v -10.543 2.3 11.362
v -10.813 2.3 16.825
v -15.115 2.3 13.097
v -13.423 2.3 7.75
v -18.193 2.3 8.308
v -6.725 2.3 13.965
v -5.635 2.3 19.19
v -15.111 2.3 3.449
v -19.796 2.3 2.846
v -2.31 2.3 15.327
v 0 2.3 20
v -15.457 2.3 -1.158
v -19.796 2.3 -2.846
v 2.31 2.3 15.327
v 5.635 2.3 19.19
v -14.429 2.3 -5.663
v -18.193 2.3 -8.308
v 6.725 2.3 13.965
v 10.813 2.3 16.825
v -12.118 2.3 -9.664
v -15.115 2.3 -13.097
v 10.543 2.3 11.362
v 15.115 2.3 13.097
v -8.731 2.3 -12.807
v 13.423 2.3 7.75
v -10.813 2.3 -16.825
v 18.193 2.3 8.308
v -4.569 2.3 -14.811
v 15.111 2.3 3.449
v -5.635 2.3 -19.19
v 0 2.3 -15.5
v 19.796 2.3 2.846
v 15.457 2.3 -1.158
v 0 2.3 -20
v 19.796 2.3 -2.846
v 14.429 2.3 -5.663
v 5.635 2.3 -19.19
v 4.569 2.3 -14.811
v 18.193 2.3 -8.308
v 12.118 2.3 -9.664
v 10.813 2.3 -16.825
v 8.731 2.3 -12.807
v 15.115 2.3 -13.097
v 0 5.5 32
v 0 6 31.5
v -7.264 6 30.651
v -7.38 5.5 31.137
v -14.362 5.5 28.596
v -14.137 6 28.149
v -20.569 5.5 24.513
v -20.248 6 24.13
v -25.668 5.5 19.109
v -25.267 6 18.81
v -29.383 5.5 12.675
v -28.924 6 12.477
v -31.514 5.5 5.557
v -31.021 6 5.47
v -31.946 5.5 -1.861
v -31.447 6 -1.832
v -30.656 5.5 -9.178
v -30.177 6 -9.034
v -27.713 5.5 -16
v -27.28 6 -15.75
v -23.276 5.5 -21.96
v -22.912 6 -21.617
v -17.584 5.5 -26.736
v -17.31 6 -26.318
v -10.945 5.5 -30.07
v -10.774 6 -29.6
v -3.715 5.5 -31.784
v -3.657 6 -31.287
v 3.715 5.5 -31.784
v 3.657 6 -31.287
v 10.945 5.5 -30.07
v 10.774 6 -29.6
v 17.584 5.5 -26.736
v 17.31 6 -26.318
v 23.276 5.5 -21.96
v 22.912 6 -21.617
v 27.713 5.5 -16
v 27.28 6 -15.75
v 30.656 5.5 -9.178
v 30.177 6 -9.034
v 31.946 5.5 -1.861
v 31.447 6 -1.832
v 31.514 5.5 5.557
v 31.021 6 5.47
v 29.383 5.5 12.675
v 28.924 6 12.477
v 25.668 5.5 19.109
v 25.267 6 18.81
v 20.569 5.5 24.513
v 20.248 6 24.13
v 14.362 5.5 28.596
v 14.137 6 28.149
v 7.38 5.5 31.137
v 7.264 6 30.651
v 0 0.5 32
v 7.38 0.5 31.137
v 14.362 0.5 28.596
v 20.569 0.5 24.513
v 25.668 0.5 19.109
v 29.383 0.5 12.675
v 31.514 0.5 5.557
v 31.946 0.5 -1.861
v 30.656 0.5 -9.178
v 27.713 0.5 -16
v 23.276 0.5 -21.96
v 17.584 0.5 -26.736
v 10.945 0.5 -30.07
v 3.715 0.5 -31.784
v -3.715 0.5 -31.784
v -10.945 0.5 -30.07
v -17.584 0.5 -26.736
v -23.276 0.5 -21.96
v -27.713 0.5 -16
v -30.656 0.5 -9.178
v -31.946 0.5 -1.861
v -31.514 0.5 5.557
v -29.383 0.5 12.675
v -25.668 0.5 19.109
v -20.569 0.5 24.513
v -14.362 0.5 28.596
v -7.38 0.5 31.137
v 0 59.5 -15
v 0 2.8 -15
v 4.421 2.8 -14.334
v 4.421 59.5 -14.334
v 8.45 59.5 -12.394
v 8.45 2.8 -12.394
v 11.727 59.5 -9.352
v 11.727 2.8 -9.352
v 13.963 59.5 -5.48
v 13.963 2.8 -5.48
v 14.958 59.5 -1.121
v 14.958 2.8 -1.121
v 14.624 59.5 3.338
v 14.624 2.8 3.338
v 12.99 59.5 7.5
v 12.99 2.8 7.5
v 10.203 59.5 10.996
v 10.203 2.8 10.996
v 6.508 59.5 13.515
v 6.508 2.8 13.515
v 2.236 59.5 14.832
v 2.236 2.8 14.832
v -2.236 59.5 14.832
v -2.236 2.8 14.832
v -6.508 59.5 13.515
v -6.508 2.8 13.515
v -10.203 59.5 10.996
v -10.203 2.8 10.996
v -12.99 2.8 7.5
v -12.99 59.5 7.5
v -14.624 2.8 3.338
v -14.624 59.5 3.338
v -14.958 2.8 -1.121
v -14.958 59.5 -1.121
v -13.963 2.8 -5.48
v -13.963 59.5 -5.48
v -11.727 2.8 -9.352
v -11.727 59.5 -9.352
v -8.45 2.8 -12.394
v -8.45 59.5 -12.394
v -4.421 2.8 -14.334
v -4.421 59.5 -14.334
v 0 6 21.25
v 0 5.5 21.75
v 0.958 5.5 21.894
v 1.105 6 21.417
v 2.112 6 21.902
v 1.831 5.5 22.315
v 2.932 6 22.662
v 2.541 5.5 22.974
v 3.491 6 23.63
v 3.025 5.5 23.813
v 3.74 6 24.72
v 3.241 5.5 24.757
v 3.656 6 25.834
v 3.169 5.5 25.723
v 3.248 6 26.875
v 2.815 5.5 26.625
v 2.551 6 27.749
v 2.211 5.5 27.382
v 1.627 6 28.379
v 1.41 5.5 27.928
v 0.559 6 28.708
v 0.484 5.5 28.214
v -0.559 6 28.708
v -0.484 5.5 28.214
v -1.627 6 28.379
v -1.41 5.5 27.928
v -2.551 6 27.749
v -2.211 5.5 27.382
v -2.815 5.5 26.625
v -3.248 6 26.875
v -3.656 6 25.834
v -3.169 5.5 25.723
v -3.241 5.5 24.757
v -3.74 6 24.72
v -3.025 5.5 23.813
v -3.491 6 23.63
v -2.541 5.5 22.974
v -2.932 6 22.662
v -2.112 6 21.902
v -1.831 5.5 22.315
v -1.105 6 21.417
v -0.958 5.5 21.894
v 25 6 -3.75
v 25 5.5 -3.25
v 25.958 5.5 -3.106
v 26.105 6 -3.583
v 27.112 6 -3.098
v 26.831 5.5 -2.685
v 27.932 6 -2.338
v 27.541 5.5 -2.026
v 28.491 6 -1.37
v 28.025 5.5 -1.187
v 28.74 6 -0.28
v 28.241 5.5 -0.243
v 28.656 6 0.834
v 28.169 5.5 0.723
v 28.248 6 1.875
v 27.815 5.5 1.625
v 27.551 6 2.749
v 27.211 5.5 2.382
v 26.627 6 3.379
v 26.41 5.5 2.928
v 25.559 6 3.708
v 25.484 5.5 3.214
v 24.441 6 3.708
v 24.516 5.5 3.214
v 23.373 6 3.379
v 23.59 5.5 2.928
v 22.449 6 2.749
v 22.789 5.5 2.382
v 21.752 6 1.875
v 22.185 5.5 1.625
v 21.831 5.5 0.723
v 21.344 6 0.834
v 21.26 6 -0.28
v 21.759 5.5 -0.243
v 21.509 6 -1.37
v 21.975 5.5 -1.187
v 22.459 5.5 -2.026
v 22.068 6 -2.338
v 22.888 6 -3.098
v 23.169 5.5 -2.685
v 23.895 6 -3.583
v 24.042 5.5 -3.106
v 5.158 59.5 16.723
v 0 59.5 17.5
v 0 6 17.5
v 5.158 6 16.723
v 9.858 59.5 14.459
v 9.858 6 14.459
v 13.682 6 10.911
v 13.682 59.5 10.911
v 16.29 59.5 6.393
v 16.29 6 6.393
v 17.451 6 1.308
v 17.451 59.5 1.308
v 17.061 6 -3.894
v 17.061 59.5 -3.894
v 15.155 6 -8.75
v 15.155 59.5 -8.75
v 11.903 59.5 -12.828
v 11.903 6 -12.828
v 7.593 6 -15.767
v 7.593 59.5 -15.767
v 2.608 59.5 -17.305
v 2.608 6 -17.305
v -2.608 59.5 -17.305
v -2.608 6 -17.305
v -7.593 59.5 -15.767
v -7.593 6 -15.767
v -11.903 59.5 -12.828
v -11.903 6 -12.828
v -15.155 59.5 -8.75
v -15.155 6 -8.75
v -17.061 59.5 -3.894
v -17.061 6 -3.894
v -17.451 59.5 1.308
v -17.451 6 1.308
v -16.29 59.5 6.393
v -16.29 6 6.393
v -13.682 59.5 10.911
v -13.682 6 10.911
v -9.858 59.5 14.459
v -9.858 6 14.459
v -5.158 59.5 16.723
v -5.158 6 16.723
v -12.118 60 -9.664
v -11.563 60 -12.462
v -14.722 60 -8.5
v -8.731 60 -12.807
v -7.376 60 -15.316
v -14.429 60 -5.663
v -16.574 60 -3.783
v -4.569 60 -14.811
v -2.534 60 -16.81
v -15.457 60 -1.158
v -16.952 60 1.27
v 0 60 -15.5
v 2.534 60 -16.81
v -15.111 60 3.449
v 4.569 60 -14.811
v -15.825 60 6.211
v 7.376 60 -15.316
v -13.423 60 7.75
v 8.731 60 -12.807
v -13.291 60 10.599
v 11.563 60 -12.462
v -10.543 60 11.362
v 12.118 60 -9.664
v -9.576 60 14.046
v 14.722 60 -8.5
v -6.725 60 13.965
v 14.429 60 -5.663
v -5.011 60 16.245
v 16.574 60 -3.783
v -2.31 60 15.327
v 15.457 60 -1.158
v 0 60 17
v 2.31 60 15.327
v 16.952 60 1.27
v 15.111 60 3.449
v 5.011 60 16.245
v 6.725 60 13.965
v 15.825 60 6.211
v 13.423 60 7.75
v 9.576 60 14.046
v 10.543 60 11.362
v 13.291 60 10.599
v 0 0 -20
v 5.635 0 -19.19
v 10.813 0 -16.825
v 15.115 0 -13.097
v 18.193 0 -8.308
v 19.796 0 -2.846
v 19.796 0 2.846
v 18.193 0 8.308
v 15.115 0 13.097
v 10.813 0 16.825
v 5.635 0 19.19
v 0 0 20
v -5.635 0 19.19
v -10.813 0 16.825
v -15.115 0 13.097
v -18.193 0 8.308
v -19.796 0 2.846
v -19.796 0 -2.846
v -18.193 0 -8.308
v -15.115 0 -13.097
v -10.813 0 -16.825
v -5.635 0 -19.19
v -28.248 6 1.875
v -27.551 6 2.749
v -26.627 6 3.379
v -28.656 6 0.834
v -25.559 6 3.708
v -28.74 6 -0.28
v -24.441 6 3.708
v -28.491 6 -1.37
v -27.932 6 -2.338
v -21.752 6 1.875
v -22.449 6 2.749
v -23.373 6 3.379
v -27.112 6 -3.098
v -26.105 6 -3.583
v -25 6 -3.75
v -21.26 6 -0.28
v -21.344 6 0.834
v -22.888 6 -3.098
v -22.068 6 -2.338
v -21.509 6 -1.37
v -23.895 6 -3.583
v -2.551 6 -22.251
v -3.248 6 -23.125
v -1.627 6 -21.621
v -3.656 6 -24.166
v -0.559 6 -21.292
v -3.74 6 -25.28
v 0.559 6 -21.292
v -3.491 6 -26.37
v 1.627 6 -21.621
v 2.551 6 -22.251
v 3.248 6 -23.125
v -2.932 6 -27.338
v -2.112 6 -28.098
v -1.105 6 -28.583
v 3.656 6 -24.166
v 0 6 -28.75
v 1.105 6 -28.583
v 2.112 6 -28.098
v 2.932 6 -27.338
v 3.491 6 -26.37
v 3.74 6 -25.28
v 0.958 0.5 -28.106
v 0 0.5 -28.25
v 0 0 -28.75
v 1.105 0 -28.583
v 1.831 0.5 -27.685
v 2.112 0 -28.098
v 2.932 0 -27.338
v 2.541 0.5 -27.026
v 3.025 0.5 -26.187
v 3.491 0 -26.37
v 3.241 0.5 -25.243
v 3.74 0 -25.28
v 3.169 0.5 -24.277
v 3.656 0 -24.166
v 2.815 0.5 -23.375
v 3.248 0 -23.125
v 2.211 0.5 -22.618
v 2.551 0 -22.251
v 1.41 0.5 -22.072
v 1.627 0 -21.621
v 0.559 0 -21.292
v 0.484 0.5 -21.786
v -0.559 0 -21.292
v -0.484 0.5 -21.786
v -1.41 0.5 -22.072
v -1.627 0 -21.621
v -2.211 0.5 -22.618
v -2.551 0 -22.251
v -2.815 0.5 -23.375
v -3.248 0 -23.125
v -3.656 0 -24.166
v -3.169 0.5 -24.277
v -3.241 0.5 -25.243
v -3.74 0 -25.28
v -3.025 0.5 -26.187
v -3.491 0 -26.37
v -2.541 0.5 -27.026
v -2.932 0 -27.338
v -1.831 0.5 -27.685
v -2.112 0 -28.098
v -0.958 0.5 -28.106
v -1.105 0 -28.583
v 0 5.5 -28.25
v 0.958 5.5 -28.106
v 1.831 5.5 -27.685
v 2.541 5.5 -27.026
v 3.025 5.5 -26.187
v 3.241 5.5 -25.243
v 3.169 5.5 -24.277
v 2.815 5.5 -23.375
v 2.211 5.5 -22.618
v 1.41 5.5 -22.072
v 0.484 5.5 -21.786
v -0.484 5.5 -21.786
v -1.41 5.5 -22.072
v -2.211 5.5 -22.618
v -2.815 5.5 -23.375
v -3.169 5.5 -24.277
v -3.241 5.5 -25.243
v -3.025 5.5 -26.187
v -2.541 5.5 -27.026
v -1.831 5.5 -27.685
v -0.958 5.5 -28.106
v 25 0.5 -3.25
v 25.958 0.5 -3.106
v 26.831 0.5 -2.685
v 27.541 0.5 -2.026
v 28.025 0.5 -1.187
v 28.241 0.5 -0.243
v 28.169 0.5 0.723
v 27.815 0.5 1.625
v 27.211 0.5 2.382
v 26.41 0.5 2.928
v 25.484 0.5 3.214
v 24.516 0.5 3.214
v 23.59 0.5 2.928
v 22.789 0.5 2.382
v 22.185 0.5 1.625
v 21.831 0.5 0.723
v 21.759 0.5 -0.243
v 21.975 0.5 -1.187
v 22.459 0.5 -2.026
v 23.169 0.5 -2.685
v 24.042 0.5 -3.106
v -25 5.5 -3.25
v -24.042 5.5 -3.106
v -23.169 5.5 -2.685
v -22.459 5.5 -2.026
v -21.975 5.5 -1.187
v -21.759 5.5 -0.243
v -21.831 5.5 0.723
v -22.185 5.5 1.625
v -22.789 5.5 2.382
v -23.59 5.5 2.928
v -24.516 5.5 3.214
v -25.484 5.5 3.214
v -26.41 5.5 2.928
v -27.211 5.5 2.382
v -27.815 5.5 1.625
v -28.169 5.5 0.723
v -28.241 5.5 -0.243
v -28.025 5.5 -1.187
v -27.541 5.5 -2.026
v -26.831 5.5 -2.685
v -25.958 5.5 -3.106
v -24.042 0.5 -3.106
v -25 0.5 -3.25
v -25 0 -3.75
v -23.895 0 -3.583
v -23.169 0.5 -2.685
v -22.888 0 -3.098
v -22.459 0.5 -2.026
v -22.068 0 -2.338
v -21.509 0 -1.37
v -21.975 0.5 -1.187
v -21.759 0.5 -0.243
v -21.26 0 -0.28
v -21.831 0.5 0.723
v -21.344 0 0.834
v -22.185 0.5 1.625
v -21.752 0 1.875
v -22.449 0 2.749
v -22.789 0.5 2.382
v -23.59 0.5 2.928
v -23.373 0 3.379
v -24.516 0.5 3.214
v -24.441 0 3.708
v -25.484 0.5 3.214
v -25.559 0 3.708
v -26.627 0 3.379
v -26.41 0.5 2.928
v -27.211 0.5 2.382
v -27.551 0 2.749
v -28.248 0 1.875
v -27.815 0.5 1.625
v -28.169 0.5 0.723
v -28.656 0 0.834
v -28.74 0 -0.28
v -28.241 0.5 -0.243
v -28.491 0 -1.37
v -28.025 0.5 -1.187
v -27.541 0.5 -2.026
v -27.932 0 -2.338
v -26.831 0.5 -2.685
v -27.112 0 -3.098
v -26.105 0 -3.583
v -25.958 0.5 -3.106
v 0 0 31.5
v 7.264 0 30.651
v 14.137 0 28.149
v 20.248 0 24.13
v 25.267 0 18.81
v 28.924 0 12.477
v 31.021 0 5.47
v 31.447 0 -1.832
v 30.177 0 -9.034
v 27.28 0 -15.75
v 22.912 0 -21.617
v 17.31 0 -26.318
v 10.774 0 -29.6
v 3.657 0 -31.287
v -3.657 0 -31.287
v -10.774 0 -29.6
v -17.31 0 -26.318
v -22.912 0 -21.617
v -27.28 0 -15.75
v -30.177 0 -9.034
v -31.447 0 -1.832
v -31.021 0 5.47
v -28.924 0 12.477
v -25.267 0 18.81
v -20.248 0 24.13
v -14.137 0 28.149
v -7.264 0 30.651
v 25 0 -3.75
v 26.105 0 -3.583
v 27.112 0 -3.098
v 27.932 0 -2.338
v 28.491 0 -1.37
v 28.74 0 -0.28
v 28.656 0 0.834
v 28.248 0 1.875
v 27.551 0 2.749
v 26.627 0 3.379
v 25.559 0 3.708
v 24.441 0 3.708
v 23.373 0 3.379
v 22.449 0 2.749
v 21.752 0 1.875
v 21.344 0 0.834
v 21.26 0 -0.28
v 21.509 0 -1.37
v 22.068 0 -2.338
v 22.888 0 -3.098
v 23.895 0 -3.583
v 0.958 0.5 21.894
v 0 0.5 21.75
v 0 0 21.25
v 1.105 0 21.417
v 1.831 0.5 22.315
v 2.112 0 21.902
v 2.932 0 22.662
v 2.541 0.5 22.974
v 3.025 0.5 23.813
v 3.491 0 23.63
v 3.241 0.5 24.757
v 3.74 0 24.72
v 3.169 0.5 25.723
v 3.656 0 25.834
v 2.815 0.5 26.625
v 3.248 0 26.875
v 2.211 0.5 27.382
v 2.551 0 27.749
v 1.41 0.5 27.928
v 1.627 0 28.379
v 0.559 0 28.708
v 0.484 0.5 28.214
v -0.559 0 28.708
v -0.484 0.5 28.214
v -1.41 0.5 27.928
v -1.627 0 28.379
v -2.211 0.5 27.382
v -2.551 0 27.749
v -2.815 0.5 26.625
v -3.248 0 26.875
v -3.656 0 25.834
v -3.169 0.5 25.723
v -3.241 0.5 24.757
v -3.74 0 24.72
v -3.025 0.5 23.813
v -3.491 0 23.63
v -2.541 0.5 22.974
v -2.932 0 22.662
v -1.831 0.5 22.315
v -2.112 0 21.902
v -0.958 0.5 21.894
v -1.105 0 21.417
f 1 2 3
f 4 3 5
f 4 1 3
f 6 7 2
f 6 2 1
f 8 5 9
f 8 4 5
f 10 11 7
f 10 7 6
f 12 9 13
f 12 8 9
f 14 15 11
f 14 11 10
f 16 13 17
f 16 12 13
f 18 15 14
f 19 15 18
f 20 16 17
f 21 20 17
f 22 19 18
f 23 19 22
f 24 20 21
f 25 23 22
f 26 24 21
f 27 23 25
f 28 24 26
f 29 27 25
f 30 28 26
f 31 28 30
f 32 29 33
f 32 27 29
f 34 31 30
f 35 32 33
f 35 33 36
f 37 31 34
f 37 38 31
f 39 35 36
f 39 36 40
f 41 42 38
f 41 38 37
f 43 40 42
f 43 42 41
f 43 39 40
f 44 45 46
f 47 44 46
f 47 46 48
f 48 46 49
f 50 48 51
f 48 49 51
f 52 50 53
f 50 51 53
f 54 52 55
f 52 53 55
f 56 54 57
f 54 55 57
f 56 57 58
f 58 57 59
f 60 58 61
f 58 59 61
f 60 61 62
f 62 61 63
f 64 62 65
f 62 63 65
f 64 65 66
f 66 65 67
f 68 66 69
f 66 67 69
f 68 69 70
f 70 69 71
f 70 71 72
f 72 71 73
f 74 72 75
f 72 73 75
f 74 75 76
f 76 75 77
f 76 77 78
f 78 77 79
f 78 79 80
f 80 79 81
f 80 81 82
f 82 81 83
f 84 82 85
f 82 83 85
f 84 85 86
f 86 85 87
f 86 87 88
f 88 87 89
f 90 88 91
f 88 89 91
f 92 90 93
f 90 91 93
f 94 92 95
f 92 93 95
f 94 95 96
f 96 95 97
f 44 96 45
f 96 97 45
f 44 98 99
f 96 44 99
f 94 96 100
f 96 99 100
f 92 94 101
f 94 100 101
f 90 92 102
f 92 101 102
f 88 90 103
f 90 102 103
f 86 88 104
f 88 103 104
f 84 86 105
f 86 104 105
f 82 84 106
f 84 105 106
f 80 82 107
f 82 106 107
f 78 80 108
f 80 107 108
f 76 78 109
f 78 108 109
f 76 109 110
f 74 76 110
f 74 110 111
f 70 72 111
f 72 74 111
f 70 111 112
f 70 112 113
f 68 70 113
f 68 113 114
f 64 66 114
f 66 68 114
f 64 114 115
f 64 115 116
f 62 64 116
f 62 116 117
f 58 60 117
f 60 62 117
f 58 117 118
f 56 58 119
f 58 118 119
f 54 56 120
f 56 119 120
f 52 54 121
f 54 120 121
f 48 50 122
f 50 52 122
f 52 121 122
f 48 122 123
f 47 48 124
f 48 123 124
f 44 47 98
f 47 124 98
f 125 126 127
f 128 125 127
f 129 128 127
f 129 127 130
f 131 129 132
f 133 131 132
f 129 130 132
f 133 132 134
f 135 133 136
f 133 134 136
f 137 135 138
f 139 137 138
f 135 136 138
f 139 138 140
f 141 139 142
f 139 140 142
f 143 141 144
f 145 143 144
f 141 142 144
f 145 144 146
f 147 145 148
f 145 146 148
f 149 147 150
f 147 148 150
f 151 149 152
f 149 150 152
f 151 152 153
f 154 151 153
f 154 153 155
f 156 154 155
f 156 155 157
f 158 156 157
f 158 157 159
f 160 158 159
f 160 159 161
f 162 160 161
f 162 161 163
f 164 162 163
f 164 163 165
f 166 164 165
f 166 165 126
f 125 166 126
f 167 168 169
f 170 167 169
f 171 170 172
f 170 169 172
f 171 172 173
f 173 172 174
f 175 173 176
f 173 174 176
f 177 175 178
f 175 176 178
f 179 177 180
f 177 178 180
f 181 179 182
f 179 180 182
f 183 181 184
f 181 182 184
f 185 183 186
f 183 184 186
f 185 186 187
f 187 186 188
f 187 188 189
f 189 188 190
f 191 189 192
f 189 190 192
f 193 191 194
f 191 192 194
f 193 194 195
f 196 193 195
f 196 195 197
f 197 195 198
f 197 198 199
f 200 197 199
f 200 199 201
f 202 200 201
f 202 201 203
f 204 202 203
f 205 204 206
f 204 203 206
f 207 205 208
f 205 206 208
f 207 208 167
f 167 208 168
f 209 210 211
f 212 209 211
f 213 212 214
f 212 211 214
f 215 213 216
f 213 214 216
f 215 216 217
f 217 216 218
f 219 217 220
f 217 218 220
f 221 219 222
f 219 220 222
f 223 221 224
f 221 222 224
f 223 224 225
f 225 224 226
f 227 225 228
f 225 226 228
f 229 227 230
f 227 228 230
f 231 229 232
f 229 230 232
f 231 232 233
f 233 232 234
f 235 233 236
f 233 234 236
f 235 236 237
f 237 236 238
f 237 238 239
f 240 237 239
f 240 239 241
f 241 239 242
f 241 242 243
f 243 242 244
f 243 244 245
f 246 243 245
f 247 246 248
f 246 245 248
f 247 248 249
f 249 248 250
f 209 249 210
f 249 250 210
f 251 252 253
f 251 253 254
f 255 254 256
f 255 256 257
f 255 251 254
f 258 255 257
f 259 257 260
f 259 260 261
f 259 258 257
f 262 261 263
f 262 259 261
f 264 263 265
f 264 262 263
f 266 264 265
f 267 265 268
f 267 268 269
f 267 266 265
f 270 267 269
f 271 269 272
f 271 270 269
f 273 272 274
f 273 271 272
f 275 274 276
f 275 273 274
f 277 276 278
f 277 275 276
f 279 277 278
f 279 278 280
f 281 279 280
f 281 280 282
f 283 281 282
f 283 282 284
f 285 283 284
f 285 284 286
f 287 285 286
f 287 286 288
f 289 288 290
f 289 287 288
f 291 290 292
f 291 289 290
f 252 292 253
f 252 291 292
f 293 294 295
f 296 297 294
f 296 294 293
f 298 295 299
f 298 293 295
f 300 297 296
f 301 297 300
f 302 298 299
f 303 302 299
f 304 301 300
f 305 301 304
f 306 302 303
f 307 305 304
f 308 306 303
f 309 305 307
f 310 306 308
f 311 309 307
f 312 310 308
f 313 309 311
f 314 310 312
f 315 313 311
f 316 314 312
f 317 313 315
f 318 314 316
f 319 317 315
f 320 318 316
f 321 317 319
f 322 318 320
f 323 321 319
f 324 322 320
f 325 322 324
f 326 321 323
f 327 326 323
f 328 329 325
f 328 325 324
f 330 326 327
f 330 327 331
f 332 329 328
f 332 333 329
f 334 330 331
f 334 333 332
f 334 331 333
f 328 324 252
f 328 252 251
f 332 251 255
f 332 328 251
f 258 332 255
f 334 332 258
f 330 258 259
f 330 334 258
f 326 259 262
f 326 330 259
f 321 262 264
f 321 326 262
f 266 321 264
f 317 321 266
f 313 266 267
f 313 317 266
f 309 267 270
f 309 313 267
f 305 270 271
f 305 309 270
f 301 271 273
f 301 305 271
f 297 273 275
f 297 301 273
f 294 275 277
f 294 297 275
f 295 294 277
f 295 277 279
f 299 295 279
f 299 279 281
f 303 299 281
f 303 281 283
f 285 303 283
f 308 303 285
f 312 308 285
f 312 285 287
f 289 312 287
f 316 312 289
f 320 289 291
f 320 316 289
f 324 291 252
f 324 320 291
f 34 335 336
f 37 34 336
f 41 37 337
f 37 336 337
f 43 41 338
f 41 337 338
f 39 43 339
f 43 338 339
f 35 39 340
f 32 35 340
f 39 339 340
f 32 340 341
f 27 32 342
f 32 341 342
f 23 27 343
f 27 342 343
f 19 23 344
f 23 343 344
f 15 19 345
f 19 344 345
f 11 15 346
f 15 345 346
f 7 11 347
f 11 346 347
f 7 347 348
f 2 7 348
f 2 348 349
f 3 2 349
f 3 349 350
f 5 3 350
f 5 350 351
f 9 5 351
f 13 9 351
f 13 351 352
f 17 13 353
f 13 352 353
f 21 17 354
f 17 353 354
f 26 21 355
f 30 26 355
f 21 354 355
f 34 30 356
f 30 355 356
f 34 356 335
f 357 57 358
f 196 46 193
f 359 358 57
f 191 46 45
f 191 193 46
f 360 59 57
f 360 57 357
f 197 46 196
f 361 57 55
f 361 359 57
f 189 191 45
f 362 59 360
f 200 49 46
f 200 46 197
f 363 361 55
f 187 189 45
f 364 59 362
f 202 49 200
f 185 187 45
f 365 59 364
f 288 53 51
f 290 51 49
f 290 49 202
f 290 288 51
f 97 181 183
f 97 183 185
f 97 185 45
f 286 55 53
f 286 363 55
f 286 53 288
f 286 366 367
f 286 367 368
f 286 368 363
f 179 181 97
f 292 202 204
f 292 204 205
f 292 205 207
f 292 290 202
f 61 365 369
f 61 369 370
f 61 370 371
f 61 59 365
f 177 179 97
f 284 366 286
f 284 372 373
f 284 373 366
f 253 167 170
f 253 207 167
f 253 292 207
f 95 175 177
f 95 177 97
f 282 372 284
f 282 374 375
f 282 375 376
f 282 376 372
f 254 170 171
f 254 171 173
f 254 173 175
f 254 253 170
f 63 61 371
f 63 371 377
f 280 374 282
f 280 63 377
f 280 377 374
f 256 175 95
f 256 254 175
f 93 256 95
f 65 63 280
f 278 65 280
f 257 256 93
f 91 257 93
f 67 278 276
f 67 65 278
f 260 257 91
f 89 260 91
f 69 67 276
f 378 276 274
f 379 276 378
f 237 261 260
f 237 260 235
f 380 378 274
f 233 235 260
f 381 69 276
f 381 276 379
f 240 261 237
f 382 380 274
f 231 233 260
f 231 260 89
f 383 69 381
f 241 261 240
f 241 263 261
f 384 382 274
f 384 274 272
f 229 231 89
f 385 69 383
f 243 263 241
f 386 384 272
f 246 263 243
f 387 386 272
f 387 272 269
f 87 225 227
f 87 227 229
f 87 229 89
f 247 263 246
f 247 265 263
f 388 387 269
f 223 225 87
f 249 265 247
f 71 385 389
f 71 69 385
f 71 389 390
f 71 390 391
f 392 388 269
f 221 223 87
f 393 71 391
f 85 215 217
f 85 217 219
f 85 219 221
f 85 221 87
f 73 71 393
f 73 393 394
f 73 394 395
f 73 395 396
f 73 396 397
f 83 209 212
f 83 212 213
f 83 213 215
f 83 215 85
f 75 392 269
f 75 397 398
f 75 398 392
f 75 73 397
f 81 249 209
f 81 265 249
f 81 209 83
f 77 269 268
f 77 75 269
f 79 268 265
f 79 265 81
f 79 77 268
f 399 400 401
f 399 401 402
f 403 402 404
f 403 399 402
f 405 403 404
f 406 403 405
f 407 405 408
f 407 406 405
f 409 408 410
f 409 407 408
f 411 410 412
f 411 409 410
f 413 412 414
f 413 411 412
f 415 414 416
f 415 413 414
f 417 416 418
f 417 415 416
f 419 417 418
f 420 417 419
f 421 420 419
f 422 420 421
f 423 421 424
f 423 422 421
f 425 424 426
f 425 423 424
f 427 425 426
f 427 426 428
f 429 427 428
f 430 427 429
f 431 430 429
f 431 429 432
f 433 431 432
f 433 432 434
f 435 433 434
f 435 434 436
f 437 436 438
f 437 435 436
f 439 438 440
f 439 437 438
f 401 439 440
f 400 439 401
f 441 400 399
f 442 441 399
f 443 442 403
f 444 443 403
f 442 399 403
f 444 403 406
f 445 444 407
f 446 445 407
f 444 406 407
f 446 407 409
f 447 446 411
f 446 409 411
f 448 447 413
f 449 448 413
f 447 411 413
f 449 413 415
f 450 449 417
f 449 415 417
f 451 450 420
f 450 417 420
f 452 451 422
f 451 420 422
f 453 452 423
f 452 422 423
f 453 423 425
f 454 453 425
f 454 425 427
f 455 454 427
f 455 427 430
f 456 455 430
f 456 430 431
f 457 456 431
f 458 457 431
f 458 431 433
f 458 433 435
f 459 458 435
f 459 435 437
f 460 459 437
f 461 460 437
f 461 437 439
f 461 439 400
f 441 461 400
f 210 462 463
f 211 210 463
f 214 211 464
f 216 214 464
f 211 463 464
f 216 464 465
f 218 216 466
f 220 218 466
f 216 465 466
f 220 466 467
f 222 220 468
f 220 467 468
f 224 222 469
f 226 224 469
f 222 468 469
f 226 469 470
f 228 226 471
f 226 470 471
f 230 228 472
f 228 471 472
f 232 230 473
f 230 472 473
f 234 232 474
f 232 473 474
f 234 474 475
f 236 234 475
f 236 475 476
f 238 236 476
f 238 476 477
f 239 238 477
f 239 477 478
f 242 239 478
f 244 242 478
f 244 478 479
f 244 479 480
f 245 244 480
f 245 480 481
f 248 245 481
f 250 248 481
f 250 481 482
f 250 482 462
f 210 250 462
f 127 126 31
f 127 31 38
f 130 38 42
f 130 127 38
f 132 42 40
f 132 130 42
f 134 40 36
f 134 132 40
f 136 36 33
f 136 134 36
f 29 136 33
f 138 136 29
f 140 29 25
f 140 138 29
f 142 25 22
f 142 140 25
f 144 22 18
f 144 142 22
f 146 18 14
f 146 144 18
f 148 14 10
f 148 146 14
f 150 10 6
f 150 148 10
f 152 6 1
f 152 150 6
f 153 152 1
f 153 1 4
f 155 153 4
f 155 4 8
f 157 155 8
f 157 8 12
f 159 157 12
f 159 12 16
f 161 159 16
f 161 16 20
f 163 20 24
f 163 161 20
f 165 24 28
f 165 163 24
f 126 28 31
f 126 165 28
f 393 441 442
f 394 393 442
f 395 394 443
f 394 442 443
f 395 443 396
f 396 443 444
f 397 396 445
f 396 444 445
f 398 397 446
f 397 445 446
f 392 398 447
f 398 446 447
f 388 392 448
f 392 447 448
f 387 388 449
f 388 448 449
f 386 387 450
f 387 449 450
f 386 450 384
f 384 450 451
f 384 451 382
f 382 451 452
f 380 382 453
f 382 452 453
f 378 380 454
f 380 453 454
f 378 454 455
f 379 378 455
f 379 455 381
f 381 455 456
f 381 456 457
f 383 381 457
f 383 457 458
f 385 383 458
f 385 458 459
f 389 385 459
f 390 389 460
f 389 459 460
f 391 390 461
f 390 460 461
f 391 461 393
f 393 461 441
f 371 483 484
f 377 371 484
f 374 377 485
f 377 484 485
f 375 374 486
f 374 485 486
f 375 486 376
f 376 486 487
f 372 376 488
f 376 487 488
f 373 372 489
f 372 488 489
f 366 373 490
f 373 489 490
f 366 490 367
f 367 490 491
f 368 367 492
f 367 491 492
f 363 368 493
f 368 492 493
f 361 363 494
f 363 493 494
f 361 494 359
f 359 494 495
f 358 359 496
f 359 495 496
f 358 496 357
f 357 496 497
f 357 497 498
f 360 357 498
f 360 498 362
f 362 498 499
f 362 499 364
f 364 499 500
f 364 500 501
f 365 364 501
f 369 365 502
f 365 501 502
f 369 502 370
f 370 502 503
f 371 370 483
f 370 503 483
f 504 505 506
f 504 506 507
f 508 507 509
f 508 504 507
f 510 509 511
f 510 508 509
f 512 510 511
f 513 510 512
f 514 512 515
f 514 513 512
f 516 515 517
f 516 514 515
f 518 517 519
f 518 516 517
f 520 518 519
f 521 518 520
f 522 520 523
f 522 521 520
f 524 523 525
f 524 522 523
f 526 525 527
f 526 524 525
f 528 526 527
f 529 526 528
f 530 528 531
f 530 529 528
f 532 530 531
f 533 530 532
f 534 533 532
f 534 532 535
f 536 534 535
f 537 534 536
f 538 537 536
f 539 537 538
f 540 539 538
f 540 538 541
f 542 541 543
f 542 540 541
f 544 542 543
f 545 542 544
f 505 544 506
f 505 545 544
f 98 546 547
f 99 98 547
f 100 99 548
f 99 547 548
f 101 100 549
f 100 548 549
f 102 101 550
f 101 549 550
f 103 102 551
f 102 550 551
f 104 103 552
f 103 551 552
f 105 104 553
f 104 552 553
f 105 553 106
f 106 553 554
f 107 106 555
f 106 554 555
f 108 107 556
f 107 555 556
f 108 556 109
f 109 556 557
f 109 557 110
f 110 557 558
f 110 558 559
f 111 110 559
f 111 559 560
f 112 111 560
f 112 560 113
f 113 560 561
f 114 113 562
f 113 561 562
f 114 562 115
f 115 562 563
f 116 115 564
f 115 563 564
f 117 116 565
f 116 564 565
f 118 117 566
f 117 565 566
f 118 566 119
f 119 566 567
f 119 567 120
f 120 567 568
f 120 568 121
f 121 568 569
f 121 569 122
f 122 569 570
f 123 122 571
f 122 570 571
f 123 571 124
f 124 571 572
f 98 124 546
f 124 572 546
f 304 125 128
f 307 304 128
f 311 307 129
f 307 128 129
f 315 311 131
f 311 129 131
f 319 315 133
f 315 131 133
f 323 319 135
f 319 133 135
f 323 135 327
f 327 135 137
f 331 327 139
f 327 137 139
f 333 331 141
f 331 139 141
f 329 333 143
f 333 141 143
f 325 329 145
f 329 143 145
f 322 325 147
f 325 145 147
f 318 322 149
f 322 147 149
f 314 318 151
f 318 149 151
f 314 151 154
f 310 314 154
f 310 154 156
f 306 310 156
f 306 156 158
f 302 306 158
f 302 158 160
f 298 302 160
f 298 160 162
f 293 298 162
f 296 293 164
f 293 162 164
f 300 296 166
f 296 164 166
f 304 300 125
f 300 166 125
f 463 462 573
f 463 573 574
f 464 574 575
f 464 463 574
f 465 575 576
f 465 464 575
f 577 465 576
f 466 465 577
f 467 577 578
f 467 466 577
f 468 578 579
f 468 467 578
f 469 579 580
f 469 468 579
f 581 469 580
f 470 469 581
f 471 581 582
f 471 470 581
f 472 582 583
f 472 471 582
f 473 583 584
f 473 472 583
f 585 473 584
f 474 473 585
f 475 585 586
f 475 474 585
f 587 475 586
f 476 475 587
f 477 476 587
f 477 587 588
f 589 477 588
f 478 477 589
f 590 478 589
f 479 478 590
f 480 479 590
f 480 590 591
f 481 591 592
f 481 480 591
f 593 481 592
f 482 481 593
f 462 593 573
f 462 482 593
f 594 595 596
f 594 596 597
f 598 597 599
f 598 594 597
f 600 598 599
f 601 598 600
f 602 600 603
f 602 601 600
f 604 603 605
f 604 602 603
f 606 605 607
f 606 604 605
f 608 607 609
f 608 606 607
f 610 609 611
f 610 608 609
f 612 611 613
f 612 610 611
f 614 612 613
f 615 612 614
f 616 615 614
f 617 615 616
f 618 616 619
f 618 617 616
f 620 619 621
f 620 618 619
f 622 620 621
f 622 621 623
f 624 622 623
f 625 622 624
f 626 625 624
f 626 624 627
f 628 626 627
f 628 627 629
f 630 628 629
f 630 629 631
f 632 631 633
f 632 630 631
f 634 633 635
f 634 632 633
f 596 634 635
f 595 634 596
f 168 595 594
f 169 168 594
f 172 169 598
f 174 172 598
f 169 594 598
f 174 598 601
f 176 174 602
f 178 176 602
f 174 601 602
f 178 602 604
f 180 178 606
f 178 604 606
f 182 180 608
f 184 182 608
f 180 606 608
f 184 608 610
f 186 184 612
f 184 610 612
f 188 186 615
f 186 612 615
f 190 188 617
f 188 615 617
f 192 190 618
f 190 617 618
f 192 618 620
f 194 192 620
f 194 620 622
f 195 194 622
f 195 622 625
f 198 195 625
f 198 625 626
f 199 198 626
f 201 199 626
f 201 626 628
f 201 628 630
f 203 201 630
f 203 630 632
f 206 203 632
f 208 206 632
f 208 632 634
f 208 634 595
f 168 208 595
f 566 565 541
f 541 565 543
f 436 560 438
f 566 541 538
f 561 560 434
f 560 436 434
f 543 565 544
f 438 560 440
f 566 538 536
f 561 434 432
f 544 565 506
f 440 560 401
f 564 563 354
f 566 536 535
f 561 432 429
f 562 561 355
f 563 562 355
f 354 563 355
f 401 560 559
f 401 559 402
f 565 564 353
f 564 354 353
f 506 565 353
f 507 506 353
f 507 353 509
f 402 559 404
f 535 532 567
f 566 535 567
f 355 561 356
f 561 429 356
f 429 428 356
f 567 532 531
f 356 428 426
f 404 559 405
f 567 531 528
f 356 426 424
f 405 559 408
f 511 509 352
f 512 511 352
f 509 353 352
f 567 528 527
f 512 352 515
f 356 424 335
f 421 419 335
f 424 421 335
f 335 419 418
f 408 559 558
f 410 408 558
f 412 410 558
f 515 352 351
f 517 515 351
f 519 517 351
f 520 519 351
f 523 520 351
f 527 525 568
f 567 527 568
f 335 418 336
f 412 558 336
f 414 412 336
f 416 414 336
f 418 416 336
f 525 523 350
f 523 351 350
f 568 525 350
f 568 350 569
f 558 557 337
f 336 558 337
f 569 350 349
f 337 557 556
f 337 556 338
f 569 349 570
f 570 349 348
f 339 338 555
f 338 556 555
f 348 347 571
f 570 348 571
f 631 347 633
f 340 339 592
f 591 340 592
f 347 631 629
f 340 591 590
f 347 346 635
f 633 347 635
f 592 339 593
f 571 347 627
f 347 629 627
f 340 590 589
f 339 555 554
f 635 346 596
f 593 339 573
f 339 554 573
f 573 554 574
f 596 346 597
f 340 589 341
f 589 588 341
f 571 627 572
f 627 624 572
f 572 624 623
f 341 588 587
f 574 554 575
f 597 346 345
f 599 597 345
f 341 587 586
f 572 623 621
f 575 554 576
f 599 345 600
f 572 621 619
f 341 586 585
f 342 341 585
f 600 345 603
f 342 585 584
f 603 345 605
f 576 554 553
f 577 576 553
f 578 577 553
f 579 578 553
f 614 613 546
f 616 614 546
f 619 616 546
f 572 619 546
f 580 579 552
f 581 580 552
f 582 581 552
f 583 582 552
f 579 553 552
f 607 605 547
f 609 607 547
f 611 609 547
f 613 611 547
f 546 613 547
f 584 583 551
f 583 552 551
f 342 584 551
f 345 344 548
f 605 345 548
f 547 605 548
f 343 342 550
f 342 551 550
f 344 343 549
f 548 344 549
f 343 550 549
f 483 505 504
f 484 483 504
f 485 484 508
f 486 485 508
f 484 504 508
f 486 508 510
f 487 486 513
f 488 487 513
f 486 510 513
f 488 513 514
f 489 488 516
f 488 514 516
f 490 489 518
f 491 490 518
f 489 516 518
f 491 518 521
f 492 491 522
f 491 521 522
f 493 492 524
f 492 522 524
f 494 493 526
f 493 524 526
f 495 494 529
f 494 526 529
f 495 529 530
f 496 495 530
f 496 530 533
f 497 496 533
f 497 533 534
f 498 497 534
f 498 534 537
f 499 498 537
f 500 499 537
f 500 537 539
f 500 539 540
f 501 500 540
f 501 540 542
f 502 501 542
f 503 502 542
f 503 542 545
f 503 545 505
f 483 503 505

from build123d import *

# Parameters (mm, degrees)
SKETCH1_R           = 32
BOSS_EXTRUDE1_DEPTH = 60
SKETCH2_OUTSIDE_W   = 87.718
SKETCH2_OUTSIDE_H   = 87.718
SKETCH2_OUTSIDE_R   = 17.5
CUT_EXTRUDE1_DEPTH  = 54
SKETCH4_R           = 20
CUT_EXTRUDE2_DEPTH  = 2.3
SKETCH5_R           = 15
CUT_EXTRUDE3_DEPTH  = 74.3300075
CHAMFER1_SIZE       = 0.5
SKETCH6_R           = 3.25
CUT_EXTRUDE4_DEPTH  = 76.153176912
CHAMFER2_SIZE       = 0.5


with BuildPart() as part:
    # Sketch1 → Boss-Extrude1 (new body)
    with BuildSketch(Plane(origin=(0, 0, 0), x_dir=(1, 0, 0), z_dir=(0, 1, 0))):
        with Locations(Location((0, 0, 0), (0, 0, 270))):
            Circle(SKETCH1_R)
    extrude(amount=BOSS_EXTRUDE1_DEPTH)

    # Sketch2 outside → Cut-Extrude1 (cut)
    with BuildSketch(Plane(origin=(0, 60, 0), x_dir=(1, 0, 0), z_dir=(0, 1, 0))):
        Rectangle(SKETCH2_OUTSIDE_W, SKETCH2_OUTSIDE_H)
        with Locations(Location((0, 0, 0), (0, 0, 270))):
            Circle(SKETCH2_OUTSIDE_R, mode=Mode.SUBTRACT)
    extrude(amount=-CUT_EXTRUDE1_DEPTH, mode=Mode.SUBTRACT)

    # Sketch4 → Cut-Extrude2 (cut)
    with BuildSketch(Plane.XZ):
        with Locations(Location((0, 0, 0), (0, 0, 270))):
            Circle(SKETCH4_R)
    extrude(amount=-CUT_EXTRUDE2_DEPTH, mode=Mode.SUBTRACT)

    # Sketch5 → Cut-Extrude3 (cut, through all)
    with BuildSketch(Plane.XZ.offset(-2.3)):
        with Locations(Location((0, 0, 0), (0, 0, 270))):
            Circle(SKETCH5_R)
    extrude(amount=-CUT_EXTRUDE3_DEPTH, mode=Mode.SUBTRACT)

    # Chamfer1
    chamfer1_edges = [part.edges().sort_by_distance(p)[0] for p in [
        (0, 60, -17.5),
        (0, 0, -32),
        (0, 60, 15),
        (0, 2.3, 15),
        (0, 6, -32),
    ]]
    chamfer(chamfer1_edges, length=CHAMFER1_SIZE)

    # Sketch6 → Cut-Extrude4 (cut, through all)
    with BuildSketch(Plane.XZ):
        with Locations(Location((25, 0, 0), (0, 0, 270))):
            Circle(SKETCH6_R)
        with Locations(Location((0, -25, 0), (0, 0, 270))):
            Circle(SKETCH6_R)
        with Locations(Location((-25, 0, 0), (0, 0, 270))):
            Circle(SKETCH6_R)
        with Locations(Location((0, 25, 0), (0, 0, 270))):
            Circle(SKETCH6_R)
    extrude(amount=-CUT_EXTRUDE4_DEPTH, mode=Mode.SUBTRACT)

    # Chamfer2
    chamfer2_edges = [part.edges().sort_by_distance(p)[0] for p in [
        (25, 6, 3.25),
        (25, 0, 3.25),
        (0, 6, -21.75),
        (0, 0, -21.75),
        (-25, 6, 3.25),
        (-25, 0, 3.25),
        (0, 6, 28.25),
        (0, 0, 28.25),
    ]]
    chamfer(chamfer2_edges, length=CHAMFER2_SIZE)


solid = part.part
